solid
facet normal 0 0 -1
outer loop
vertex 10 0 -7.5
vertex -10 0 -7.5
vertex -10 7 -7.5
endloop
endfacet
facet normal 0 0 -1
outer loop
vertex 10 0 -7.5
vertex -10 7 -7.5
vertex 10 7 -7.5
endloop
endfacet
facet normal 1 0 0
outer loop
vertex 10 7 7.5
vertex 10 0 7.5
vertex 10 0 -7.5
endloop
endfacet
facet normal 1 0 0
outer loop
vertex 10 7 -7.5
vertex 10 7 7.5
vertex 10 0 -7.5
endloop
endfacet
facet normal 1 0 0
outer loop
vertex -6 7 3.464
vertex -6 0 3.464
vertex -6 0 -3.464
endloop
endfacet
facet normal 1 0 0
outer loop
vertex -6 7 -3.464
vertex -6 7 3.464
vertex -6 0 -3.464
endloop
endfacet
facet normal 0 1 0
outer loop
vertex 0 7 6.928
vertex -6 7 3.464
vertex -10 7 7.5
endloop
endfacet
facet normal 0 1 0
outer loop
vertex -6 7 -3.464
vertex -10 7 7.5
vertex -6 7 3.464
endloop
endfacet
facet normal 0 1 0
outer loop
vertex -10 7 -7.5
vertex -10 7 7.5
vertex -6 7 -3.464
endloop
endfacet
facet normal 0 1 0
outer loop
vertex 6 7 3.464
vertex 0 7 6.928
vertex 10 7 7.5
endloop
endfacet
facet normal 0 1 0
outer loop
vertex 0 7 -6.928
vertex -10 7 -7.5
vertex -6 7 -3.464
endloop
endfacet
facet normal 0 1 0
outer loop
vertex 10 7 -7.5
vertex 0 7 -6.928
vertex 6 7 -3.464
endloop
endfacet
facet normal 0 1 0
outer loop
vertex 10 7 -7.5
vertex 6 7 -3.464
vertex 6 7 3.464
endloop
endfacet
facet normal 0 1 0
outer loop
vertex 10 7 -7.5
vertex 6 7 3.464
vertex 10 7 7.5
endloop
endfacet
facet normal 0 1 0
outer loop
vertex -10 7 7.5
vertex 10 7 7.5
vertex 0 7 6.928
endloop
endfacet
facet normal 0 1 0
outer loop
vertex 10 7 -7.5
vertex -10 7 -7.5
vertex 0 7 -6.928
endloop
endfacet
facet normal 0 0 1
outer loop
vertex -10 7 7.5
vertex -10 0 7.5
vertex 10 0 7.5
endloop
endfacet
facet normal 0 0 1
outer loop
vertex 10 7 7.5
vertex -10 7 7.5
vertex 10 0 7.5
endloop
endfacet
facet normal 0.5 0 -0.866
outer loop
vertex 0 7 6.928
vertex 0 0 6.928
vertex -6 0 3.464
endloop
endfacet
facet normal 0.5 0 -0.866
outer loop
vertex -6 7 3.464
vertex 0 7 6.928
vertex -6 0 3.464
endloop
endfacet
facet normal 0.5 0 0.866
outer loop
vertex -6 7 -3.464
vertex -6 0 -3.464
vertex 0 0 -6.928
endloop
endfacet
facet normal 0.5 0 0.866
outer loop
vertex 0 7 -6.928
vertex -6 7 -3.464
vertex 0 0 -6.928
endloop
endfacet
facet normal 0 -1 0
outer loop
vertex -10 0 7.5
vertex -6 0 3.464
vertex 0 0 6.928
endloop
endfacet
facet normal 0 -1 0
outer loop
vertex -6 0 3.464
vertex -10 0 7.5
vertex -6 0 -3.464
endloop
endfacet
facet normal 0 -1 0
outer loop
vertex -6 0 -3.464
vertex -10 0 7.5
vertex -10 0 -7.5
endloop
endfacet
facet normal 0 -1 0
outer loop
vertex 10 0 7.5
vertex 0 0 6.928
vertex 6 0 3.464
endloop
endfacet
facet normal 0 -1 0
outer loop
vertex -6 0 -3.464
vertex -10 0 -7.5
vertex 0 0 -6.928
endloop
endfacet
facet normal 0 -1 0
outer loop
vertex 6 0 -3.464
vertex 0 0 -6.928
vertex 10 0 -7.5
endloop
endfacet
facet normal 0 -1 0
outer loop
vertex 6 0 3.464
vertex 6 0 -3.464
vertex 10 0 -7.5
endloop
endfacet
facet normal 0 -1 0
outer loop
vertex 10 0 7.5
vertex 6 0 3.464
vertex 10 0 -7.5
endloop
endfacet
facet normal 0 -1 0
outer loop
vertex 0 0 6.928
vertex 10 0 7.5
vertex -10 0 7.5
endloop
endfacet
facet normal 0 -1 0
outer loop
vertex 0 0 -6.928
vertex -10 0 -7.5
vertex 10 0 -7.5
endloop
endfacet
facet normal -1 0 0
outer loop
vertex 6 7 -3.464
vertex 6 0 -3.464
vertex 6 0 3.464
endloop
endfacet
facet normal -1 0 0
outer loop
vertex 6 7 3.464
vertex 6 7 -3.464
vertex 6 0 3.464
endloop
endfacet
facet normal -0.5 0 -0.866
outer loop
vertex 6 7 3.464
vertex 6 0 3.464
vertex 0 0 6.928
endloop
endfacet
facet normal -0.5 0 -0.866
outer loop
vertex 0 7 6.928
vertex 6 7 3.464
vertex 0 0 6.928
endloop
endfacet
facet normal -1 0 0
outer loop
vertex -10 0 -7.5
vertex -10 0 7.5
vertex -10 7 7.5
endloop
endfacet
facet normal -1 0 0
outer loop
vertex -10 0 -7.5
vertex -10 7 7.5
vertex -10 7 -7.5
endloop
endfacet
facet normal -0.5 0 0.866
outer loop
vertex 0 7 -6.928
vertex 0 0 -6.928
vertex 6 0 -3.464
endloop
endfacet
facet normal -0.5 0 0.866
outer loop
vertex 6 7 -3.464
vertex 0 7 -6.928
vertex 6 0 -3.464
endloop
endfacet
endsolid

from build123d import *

# Parameters (mm, degrees)
CROQUIS1_W              = 20
CROQUIS1_H              = 15
SALIENTE_EXTRUIR1_DEPTH = 7
CORTAR_EXTRUIR4_DEPTH   = 7


with BuildPart() as part:
    # Croquis1 → Saliente-Extruir1 (new body)
    with BuildSketch(Plane(origin=(0, 0, 0), x_dir=(1, 0, 0), z_dir=(0, 1, 0))):
        Rectangle(CROQUIS1_W, CROQUIS1_H)
    extrude(amount=SALIENTE_EXTRUIR1_DEPTH)

    # Croquis8 → Cortar-Extruir4 (cut)
    with BuildSketch(Plane.XZ):
        Polygon((0, 6.92820323), (-6, 3.464101615), (-6, -3.464101615), (0, -6.92820323), (6, -3.464101615), (6, 3.464101615), align=None)
    extrude(amount=-CORTAR_EXTRUIR4_DEPTH, mode=Mode.SUBTRACT)


solid = part.part
